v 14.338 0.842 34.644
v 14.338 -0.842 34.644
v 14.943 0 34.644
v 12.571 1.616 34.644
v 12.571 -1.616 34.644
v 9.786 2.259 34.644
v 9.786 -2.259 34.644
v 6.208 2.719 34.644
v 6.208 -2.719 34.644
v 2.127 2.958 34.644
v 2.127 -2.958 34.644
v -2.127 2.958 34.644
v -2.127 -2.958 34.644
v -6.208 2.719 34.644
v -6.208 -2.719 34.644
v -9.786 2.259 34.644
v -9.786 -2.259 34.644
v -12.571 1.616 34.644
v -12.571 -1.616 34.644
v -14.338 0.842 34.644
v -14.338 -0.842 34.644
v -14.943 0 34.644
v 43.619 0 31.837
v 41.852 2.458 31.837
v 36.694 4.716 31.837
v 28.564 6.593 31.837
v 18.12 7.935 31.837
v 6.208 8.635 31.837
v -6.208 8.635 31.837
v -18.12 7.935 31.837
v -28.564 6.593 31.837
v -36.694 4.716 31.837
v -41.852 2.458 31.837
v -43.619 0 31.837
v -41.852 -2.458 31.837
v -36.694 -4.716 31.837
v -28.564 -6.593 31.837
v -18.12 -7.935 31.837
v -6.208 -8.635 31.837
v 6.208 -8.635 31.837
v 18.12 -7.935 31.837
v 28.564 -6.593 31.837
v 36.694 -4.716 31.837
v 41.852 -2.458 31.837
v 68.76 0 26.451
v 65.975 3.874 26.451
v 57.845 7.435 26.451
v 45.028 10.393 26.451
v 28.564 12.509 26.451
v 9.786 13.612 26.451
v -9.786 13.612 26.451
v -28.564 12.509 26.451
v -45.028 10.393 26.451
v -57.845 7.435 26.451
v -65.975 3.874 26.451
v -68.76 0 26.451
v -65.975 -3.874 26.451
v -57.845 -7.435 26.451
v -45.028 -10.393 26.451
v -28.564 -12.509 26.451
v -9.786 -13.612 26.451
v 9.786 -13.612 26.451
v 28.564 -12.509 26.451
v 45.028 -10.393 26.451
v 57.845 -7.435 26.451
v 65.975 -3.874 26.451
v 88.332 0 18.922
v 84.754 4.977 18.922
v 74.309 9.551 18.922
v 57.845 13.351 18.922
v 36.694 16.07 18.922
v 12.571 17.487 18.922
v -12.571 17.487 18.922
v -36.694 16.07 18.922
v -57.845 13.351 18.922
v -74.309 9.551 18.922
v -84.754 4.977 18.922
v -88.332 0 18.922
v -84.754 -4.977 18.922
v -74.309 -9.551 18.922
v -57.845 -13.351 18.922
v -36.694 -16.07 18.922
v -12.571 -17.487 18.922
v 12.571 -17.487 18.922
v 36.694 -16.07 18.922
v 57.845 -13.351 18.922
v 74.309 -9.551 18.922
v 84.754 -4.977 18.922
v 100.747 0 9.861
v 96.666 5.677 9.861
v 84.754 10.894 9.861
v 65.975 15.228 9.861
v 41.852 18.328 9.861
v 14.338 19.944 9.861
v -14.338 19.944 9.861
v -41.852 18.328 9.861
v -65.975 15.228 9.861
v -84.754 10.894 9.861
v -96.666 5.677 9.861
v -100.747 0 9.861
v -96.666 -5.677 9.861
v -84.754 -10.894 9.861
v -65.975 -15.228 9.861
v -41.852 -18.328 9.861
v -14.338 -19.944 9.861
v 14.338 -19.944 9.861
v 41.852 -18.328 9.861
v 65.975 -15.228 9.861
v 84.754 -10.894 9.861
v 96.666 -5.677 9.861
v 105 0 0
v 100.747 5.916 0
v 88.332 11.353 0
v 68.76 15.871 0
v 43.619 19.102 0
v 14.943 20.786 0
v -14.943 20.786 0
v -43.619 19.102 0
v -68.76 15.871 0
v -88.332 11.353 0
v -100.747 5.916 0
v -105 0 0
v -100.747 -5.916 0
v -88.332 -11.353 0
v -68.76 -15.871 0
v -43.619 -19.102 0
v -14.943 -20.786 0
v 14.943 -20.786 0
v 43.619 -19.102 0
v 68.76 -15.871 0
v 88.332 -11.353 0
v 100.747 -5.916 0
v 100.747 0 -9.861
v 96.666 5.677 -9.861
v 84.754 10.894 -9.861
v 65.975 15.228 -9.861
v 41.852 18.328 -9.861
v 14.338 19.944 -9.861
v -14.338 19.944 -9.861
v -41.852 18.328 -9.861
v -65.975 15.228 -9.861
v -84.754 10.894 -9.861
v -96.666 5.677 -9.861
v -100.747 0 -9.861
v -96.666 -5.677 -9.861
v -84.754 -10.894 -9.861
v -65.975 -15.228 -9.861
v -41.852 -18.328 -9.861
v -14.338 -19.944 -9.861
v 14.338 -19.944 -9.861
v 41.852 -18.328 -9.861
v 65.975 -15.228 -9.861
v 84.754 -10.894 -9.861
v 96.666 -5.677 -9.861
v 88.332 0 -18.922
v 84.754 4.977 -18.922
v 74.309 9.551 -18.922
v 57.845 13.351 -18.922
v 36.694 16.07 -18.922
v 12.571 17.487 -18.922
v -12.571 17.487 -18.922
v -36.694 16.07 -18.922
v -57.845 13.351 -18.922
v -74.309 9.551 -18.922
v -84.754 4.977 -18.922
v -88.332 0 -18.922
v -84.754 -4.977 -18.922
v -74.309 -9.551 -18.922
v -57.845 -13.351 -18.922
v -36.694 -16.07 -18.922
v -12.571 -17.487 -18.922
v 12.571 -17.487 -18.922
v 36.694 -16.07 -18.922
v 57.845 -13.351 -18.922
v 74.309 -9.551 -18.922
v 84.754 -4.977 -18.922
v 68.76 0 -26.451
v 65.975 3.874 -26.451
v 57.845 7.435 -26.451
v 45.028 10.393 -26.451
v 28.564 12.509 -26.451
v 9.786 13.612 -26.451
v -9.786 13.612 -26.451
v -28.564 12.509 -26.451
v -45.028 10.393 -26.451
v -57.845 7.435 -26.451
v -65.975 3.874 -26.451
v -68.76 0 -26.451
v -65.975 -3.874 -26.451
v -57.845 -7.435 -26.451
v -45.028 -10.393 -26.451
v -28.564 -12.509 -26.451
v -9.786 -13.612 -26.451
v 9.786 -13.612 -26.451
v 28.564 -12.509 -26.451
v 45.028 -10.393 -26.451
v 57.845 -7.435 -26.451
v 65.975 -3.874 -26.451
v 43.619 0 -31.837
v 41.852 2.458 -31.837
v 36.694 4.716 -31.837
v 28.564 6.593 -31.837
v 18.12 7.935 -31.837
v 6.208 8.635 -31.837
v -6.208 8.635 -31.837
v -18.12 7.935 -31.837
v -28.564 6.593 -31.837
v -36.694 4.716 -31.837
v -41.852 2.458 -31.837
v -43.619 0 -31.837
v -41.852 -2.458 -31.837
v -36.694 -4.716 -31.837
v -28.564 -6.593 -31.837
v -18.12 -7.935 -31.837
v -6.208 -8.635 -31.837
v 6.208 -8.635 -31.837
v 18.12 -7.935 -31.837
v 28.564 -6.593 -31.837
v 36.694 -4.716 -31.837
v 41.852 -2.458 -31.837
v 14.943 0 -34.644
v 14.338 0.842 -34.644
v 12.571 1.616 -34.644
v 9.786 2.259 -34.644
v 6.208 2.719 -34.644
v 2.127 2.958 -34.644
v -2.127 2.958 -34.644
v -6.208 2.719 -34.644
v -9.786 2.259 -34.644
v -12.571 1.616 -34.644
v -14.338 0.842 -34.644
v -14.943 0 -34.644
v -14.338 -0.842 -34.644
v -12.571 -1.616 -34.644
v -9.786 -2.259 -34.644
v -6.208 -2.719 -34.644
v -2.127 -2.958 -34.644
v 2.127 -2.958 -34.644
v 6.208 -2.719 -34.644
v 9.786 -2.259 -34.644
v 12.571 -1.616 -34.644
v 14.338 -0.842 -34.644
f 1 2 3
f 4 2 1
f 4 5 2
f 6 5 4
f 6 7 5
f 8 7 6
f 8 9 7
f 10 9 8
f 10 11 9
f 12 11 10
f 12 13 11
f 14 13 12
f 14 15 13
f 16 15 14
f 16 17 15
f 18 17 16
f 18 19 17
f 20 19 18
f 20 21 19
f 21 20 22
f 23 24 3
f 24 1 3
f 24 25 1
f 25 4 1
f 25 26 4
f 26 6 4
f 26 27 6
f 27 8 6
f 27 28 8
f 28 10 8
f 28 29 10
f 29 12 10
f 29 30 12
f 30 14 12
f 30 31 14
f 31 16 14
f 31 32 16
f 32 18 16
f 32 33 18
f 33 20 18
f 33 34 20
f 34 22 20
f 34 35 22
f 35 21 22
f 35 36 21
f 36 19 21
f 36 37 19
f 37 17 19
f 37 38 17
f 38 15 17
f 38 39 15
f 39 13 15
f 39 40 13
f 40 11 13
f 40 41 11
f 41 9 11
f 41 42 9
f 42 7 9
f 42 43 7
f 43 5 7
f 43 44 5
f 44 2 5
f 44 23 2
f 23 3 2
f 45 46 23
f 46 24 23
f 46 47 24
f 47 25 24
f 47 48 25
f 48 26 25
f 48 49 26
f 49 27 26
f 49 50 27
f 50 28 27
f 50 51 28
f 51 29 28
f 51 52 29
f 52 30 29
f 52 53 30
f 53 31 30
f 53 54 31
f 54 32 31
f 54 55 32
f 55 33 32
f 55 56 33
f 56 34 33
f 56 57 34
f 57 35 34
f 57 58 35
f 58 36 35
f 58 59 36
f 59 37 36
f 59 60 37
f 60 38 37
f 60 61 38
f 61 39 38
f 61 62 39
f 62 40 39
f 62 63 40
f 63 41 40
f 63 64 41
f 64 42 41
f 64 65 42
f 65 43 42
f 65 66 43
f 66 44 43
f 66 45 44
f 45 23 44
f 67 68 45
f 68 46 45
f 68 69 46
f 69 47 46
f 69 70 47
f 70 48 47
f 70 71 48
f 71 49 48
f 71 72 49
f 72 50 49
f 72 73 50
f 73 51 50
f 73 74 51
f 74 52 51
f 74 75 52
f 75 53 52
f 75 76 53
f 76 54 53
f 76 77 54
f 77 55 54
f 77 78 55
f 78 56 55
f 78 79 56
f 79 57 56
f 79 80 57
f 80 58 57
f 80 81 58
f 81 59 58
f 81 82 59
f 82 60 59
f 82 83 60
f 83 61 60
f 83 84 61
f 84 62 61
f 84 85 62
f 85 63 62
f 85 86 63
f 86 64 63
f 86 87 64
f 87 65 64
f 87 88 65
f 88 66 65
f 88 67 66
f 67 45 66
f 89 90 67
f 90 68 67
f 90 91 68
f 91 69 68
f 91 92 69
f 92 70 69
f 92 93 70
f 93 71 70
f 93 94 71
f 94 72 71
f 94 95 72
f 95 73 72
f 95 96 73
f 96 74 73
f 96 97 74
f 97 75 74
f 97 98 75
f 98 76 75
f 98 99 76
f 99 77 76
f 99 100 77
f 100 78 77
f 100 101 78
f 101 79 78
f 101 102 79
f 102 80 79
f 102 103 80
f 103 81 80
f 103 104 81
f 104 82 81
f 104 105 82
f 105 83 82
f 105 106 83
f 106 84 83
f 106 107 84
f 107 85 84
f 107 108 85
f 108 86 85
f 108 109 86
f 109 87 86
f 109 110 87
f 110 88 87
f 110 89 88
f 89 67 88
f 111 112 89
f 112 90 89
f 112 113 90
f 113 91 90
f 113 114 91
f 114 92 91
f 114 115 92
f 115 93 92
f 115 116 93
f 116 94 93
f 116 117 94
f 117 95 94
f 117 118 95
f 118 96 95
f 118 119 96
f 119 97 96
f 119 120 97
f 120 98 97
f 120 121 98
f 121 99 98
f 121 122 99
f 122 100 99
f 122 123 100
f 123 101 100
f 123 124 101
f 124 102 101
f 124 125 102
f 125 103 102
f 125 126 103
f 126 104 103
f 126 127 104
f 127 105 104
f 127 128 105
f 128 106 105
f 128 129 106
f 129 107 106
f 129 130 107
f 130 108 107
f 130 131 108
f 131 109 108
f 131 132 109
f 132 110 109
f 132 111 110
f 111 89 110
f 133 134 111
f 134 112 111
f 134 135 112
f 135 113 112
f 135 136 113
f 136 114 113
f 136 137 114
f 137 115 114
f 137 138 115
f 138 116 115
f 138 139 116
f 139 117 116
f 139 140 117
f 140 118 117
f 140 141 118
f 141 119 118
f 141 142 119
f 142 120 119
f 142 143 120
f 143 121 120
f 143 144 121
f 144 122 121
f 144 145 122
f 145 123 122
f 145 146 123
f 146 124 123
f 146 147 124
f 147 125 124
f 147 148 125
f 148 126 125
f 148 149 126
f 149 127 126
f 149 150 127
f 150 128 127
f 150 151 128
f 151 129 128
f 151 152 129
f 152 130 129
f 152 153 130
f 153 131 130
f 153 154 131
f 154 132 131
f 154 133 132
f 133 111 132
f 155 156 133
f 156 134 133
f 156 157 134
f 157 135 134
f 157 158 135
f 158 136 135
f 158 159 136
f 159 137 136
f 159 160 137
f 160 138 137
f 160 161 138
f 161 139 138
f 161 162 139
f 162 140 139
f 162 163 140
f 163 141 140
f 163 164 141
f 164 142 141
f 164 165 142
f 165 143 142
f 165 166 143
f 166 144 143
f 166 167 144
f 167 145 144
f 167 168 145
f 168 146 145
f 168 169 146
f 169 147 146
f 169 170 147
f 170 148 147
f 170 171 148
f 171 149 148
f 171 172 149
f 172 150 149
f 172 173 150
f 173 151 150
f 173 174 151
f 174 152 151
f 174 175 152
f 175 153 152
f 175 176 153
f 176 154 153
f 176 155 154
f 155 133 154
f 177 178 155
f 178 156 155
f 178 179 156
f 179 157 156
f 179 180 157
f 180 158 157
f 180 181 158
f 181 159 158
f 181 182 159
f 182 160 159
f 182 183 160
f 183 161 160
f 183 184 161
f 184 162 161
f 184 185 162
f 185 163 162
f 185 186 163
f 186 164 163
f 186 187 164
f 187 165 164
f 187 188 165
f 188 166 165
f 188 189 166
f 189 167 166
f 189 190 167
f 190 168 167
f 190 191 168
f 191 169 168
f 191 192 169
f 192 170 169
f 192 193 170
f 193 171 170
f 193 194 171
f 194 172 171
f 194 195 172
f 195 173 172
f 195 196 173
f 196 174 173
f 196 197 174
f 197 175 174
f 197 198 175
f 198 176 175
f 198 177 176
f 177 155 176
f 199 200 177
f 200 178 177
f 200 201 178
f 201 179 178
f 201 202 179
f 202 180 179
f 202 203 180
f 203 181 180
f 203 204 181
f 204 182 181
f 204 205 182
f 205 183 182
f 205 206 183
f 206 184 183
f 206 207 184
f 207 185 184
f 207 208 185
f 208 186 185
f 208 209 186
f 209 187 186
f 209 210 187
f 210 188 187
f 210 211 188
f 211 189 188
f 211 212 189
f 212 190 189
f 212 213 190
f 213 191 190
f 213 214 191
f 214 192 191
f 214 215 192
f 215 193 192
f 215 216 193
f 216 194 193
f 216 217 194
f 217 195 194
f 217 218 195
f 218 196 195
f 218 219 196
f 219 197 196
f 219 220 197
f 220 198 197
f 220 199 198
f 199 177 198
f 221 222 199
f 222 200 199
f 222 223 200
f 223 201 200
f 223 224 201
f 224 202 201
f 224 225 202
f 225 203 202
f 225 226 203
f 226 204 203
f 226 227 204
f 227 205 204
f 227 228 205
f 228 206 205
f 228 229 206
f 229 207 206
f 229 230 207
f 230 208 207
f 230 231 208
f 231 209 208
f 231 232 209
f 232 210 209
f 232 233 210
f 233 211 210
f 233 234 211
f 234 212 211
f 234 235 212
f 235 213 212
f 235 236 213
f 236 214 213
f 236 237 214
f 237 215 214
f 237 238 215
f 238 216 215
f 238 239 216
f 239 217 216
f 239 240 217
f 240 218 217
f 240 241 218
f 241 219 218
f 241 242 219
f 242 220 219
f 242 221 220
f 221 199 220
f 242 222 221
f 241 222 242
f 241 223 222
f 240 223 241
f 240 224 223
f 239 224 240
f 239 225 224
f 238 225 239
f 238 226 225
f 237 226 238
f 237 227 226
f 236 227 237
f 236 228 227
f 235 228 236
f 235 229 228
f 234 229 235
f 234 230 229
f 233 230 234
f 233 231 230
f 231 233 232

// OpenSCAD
// Generated by SolidPython 1.0.1 on 2020-07-29 00:46:51


scale(v = [15, 3, 5]) {
	sphere(r = 7);
}
/***********************************************
*********      SolidPython code:      **********
************************************************
 
# import packages: SolidPython
from solid import *
from solid.utils import *
from itertools import chain, combinations, permutations


class Resize:

    def __init__(self, scad_file):
        self.scad_file = scad_file
        #self.scad_file = import_scad(scad_file)
        # cone/cylinder param:
        self.r1 = 0
        self.r2 = 0
        self.h = 0
        # rectangular prism param:
        self.w = 0
        self.l = 0
        # ellipse param:
        self.r = 0

    # import OpenScad code (file name corresponds to shape)


    # classify shape + parameters
    def assign(self, param1, param2, param3):
        if self.scad_file == 'cone.scad':
            self.r1 = param1
            self.r2 = param2
            self.h = param3
        elif self.scad_file == 'cylinder.scad':
            self.r1 = param1
            self.r2 = param2
            self.h = param3
        elif self.scad_file == 'rectangularPrism.scad':
            self.h = param1
            self.l = param2
            self.w = param3
        else:
            self.r = param1
            self.h = param2

    # resize parameters
    def iterate(self):
        x = range(3, 20, 2)
        i = 1
        if self.scad_file == 'cone.scad':
            tempList = list(permutations(x, 2))
            for temp in tempList:
                param1 = temp[0]
                param2 = temp[1]
                filepath = 'produced_scad_files/' + 'cone' + str(param1) + '_' + str(param2) + '_' + '.scad'
                scad_render_to_file(cylinder(h=param1, r1=param2, r2=0), filepath)

        elif self.scad_file == 'cylinder.scad':
            tempList = list(permutations(x, 3))
            for temp in tempList:
                param1 = temp[0]
                param2 = temp[1]
                filepath = 'produced_scad_files/' + 'cylinder' + str(param1) + '_' + str(param2) + '_' + '.scad'
                scad_render_to_file(cylinder(h=param1, r1=param2, r2=param2), filepath)

        elif self.scad_file == 'rectangularPrism.scad':
            tempList = list(permutations(x, 3))
            for temp in tempList:
                param1 = temp[0]
                param2 = temp[1]
                param3 = temp[2]
                filepath = 'produced_scad_files/' + 'rectangularPrism' + str(param1) + '_' + str(param2) + '_' + str(
                    param3) + '.scad'
                scad_render_to_file(cube(size=(param1, param2, param3)), filepath)

        elif self.scad_file == 'ellipse.scad':
            tempList = list(permutations(x, 4))
            for temp in tempList:
                param1 = temp[0]
                param2 = temp[1]
                param3 = temp[2]
                param4 = temp[3]
                filepath = 'produced_scad_files/' + 'ellipse' + str(param1) + '_' + str(param2) + '_' + str(param3) + '_' + str(param4) + '.scad'
                scad_render_to_file(scale([param1, param2, param3])(sphere(r=param4)), filepath)

    def render_to_scadfile(self):
        scad_render_to_file(scad, 'example.scad') 
 
************************************************/
